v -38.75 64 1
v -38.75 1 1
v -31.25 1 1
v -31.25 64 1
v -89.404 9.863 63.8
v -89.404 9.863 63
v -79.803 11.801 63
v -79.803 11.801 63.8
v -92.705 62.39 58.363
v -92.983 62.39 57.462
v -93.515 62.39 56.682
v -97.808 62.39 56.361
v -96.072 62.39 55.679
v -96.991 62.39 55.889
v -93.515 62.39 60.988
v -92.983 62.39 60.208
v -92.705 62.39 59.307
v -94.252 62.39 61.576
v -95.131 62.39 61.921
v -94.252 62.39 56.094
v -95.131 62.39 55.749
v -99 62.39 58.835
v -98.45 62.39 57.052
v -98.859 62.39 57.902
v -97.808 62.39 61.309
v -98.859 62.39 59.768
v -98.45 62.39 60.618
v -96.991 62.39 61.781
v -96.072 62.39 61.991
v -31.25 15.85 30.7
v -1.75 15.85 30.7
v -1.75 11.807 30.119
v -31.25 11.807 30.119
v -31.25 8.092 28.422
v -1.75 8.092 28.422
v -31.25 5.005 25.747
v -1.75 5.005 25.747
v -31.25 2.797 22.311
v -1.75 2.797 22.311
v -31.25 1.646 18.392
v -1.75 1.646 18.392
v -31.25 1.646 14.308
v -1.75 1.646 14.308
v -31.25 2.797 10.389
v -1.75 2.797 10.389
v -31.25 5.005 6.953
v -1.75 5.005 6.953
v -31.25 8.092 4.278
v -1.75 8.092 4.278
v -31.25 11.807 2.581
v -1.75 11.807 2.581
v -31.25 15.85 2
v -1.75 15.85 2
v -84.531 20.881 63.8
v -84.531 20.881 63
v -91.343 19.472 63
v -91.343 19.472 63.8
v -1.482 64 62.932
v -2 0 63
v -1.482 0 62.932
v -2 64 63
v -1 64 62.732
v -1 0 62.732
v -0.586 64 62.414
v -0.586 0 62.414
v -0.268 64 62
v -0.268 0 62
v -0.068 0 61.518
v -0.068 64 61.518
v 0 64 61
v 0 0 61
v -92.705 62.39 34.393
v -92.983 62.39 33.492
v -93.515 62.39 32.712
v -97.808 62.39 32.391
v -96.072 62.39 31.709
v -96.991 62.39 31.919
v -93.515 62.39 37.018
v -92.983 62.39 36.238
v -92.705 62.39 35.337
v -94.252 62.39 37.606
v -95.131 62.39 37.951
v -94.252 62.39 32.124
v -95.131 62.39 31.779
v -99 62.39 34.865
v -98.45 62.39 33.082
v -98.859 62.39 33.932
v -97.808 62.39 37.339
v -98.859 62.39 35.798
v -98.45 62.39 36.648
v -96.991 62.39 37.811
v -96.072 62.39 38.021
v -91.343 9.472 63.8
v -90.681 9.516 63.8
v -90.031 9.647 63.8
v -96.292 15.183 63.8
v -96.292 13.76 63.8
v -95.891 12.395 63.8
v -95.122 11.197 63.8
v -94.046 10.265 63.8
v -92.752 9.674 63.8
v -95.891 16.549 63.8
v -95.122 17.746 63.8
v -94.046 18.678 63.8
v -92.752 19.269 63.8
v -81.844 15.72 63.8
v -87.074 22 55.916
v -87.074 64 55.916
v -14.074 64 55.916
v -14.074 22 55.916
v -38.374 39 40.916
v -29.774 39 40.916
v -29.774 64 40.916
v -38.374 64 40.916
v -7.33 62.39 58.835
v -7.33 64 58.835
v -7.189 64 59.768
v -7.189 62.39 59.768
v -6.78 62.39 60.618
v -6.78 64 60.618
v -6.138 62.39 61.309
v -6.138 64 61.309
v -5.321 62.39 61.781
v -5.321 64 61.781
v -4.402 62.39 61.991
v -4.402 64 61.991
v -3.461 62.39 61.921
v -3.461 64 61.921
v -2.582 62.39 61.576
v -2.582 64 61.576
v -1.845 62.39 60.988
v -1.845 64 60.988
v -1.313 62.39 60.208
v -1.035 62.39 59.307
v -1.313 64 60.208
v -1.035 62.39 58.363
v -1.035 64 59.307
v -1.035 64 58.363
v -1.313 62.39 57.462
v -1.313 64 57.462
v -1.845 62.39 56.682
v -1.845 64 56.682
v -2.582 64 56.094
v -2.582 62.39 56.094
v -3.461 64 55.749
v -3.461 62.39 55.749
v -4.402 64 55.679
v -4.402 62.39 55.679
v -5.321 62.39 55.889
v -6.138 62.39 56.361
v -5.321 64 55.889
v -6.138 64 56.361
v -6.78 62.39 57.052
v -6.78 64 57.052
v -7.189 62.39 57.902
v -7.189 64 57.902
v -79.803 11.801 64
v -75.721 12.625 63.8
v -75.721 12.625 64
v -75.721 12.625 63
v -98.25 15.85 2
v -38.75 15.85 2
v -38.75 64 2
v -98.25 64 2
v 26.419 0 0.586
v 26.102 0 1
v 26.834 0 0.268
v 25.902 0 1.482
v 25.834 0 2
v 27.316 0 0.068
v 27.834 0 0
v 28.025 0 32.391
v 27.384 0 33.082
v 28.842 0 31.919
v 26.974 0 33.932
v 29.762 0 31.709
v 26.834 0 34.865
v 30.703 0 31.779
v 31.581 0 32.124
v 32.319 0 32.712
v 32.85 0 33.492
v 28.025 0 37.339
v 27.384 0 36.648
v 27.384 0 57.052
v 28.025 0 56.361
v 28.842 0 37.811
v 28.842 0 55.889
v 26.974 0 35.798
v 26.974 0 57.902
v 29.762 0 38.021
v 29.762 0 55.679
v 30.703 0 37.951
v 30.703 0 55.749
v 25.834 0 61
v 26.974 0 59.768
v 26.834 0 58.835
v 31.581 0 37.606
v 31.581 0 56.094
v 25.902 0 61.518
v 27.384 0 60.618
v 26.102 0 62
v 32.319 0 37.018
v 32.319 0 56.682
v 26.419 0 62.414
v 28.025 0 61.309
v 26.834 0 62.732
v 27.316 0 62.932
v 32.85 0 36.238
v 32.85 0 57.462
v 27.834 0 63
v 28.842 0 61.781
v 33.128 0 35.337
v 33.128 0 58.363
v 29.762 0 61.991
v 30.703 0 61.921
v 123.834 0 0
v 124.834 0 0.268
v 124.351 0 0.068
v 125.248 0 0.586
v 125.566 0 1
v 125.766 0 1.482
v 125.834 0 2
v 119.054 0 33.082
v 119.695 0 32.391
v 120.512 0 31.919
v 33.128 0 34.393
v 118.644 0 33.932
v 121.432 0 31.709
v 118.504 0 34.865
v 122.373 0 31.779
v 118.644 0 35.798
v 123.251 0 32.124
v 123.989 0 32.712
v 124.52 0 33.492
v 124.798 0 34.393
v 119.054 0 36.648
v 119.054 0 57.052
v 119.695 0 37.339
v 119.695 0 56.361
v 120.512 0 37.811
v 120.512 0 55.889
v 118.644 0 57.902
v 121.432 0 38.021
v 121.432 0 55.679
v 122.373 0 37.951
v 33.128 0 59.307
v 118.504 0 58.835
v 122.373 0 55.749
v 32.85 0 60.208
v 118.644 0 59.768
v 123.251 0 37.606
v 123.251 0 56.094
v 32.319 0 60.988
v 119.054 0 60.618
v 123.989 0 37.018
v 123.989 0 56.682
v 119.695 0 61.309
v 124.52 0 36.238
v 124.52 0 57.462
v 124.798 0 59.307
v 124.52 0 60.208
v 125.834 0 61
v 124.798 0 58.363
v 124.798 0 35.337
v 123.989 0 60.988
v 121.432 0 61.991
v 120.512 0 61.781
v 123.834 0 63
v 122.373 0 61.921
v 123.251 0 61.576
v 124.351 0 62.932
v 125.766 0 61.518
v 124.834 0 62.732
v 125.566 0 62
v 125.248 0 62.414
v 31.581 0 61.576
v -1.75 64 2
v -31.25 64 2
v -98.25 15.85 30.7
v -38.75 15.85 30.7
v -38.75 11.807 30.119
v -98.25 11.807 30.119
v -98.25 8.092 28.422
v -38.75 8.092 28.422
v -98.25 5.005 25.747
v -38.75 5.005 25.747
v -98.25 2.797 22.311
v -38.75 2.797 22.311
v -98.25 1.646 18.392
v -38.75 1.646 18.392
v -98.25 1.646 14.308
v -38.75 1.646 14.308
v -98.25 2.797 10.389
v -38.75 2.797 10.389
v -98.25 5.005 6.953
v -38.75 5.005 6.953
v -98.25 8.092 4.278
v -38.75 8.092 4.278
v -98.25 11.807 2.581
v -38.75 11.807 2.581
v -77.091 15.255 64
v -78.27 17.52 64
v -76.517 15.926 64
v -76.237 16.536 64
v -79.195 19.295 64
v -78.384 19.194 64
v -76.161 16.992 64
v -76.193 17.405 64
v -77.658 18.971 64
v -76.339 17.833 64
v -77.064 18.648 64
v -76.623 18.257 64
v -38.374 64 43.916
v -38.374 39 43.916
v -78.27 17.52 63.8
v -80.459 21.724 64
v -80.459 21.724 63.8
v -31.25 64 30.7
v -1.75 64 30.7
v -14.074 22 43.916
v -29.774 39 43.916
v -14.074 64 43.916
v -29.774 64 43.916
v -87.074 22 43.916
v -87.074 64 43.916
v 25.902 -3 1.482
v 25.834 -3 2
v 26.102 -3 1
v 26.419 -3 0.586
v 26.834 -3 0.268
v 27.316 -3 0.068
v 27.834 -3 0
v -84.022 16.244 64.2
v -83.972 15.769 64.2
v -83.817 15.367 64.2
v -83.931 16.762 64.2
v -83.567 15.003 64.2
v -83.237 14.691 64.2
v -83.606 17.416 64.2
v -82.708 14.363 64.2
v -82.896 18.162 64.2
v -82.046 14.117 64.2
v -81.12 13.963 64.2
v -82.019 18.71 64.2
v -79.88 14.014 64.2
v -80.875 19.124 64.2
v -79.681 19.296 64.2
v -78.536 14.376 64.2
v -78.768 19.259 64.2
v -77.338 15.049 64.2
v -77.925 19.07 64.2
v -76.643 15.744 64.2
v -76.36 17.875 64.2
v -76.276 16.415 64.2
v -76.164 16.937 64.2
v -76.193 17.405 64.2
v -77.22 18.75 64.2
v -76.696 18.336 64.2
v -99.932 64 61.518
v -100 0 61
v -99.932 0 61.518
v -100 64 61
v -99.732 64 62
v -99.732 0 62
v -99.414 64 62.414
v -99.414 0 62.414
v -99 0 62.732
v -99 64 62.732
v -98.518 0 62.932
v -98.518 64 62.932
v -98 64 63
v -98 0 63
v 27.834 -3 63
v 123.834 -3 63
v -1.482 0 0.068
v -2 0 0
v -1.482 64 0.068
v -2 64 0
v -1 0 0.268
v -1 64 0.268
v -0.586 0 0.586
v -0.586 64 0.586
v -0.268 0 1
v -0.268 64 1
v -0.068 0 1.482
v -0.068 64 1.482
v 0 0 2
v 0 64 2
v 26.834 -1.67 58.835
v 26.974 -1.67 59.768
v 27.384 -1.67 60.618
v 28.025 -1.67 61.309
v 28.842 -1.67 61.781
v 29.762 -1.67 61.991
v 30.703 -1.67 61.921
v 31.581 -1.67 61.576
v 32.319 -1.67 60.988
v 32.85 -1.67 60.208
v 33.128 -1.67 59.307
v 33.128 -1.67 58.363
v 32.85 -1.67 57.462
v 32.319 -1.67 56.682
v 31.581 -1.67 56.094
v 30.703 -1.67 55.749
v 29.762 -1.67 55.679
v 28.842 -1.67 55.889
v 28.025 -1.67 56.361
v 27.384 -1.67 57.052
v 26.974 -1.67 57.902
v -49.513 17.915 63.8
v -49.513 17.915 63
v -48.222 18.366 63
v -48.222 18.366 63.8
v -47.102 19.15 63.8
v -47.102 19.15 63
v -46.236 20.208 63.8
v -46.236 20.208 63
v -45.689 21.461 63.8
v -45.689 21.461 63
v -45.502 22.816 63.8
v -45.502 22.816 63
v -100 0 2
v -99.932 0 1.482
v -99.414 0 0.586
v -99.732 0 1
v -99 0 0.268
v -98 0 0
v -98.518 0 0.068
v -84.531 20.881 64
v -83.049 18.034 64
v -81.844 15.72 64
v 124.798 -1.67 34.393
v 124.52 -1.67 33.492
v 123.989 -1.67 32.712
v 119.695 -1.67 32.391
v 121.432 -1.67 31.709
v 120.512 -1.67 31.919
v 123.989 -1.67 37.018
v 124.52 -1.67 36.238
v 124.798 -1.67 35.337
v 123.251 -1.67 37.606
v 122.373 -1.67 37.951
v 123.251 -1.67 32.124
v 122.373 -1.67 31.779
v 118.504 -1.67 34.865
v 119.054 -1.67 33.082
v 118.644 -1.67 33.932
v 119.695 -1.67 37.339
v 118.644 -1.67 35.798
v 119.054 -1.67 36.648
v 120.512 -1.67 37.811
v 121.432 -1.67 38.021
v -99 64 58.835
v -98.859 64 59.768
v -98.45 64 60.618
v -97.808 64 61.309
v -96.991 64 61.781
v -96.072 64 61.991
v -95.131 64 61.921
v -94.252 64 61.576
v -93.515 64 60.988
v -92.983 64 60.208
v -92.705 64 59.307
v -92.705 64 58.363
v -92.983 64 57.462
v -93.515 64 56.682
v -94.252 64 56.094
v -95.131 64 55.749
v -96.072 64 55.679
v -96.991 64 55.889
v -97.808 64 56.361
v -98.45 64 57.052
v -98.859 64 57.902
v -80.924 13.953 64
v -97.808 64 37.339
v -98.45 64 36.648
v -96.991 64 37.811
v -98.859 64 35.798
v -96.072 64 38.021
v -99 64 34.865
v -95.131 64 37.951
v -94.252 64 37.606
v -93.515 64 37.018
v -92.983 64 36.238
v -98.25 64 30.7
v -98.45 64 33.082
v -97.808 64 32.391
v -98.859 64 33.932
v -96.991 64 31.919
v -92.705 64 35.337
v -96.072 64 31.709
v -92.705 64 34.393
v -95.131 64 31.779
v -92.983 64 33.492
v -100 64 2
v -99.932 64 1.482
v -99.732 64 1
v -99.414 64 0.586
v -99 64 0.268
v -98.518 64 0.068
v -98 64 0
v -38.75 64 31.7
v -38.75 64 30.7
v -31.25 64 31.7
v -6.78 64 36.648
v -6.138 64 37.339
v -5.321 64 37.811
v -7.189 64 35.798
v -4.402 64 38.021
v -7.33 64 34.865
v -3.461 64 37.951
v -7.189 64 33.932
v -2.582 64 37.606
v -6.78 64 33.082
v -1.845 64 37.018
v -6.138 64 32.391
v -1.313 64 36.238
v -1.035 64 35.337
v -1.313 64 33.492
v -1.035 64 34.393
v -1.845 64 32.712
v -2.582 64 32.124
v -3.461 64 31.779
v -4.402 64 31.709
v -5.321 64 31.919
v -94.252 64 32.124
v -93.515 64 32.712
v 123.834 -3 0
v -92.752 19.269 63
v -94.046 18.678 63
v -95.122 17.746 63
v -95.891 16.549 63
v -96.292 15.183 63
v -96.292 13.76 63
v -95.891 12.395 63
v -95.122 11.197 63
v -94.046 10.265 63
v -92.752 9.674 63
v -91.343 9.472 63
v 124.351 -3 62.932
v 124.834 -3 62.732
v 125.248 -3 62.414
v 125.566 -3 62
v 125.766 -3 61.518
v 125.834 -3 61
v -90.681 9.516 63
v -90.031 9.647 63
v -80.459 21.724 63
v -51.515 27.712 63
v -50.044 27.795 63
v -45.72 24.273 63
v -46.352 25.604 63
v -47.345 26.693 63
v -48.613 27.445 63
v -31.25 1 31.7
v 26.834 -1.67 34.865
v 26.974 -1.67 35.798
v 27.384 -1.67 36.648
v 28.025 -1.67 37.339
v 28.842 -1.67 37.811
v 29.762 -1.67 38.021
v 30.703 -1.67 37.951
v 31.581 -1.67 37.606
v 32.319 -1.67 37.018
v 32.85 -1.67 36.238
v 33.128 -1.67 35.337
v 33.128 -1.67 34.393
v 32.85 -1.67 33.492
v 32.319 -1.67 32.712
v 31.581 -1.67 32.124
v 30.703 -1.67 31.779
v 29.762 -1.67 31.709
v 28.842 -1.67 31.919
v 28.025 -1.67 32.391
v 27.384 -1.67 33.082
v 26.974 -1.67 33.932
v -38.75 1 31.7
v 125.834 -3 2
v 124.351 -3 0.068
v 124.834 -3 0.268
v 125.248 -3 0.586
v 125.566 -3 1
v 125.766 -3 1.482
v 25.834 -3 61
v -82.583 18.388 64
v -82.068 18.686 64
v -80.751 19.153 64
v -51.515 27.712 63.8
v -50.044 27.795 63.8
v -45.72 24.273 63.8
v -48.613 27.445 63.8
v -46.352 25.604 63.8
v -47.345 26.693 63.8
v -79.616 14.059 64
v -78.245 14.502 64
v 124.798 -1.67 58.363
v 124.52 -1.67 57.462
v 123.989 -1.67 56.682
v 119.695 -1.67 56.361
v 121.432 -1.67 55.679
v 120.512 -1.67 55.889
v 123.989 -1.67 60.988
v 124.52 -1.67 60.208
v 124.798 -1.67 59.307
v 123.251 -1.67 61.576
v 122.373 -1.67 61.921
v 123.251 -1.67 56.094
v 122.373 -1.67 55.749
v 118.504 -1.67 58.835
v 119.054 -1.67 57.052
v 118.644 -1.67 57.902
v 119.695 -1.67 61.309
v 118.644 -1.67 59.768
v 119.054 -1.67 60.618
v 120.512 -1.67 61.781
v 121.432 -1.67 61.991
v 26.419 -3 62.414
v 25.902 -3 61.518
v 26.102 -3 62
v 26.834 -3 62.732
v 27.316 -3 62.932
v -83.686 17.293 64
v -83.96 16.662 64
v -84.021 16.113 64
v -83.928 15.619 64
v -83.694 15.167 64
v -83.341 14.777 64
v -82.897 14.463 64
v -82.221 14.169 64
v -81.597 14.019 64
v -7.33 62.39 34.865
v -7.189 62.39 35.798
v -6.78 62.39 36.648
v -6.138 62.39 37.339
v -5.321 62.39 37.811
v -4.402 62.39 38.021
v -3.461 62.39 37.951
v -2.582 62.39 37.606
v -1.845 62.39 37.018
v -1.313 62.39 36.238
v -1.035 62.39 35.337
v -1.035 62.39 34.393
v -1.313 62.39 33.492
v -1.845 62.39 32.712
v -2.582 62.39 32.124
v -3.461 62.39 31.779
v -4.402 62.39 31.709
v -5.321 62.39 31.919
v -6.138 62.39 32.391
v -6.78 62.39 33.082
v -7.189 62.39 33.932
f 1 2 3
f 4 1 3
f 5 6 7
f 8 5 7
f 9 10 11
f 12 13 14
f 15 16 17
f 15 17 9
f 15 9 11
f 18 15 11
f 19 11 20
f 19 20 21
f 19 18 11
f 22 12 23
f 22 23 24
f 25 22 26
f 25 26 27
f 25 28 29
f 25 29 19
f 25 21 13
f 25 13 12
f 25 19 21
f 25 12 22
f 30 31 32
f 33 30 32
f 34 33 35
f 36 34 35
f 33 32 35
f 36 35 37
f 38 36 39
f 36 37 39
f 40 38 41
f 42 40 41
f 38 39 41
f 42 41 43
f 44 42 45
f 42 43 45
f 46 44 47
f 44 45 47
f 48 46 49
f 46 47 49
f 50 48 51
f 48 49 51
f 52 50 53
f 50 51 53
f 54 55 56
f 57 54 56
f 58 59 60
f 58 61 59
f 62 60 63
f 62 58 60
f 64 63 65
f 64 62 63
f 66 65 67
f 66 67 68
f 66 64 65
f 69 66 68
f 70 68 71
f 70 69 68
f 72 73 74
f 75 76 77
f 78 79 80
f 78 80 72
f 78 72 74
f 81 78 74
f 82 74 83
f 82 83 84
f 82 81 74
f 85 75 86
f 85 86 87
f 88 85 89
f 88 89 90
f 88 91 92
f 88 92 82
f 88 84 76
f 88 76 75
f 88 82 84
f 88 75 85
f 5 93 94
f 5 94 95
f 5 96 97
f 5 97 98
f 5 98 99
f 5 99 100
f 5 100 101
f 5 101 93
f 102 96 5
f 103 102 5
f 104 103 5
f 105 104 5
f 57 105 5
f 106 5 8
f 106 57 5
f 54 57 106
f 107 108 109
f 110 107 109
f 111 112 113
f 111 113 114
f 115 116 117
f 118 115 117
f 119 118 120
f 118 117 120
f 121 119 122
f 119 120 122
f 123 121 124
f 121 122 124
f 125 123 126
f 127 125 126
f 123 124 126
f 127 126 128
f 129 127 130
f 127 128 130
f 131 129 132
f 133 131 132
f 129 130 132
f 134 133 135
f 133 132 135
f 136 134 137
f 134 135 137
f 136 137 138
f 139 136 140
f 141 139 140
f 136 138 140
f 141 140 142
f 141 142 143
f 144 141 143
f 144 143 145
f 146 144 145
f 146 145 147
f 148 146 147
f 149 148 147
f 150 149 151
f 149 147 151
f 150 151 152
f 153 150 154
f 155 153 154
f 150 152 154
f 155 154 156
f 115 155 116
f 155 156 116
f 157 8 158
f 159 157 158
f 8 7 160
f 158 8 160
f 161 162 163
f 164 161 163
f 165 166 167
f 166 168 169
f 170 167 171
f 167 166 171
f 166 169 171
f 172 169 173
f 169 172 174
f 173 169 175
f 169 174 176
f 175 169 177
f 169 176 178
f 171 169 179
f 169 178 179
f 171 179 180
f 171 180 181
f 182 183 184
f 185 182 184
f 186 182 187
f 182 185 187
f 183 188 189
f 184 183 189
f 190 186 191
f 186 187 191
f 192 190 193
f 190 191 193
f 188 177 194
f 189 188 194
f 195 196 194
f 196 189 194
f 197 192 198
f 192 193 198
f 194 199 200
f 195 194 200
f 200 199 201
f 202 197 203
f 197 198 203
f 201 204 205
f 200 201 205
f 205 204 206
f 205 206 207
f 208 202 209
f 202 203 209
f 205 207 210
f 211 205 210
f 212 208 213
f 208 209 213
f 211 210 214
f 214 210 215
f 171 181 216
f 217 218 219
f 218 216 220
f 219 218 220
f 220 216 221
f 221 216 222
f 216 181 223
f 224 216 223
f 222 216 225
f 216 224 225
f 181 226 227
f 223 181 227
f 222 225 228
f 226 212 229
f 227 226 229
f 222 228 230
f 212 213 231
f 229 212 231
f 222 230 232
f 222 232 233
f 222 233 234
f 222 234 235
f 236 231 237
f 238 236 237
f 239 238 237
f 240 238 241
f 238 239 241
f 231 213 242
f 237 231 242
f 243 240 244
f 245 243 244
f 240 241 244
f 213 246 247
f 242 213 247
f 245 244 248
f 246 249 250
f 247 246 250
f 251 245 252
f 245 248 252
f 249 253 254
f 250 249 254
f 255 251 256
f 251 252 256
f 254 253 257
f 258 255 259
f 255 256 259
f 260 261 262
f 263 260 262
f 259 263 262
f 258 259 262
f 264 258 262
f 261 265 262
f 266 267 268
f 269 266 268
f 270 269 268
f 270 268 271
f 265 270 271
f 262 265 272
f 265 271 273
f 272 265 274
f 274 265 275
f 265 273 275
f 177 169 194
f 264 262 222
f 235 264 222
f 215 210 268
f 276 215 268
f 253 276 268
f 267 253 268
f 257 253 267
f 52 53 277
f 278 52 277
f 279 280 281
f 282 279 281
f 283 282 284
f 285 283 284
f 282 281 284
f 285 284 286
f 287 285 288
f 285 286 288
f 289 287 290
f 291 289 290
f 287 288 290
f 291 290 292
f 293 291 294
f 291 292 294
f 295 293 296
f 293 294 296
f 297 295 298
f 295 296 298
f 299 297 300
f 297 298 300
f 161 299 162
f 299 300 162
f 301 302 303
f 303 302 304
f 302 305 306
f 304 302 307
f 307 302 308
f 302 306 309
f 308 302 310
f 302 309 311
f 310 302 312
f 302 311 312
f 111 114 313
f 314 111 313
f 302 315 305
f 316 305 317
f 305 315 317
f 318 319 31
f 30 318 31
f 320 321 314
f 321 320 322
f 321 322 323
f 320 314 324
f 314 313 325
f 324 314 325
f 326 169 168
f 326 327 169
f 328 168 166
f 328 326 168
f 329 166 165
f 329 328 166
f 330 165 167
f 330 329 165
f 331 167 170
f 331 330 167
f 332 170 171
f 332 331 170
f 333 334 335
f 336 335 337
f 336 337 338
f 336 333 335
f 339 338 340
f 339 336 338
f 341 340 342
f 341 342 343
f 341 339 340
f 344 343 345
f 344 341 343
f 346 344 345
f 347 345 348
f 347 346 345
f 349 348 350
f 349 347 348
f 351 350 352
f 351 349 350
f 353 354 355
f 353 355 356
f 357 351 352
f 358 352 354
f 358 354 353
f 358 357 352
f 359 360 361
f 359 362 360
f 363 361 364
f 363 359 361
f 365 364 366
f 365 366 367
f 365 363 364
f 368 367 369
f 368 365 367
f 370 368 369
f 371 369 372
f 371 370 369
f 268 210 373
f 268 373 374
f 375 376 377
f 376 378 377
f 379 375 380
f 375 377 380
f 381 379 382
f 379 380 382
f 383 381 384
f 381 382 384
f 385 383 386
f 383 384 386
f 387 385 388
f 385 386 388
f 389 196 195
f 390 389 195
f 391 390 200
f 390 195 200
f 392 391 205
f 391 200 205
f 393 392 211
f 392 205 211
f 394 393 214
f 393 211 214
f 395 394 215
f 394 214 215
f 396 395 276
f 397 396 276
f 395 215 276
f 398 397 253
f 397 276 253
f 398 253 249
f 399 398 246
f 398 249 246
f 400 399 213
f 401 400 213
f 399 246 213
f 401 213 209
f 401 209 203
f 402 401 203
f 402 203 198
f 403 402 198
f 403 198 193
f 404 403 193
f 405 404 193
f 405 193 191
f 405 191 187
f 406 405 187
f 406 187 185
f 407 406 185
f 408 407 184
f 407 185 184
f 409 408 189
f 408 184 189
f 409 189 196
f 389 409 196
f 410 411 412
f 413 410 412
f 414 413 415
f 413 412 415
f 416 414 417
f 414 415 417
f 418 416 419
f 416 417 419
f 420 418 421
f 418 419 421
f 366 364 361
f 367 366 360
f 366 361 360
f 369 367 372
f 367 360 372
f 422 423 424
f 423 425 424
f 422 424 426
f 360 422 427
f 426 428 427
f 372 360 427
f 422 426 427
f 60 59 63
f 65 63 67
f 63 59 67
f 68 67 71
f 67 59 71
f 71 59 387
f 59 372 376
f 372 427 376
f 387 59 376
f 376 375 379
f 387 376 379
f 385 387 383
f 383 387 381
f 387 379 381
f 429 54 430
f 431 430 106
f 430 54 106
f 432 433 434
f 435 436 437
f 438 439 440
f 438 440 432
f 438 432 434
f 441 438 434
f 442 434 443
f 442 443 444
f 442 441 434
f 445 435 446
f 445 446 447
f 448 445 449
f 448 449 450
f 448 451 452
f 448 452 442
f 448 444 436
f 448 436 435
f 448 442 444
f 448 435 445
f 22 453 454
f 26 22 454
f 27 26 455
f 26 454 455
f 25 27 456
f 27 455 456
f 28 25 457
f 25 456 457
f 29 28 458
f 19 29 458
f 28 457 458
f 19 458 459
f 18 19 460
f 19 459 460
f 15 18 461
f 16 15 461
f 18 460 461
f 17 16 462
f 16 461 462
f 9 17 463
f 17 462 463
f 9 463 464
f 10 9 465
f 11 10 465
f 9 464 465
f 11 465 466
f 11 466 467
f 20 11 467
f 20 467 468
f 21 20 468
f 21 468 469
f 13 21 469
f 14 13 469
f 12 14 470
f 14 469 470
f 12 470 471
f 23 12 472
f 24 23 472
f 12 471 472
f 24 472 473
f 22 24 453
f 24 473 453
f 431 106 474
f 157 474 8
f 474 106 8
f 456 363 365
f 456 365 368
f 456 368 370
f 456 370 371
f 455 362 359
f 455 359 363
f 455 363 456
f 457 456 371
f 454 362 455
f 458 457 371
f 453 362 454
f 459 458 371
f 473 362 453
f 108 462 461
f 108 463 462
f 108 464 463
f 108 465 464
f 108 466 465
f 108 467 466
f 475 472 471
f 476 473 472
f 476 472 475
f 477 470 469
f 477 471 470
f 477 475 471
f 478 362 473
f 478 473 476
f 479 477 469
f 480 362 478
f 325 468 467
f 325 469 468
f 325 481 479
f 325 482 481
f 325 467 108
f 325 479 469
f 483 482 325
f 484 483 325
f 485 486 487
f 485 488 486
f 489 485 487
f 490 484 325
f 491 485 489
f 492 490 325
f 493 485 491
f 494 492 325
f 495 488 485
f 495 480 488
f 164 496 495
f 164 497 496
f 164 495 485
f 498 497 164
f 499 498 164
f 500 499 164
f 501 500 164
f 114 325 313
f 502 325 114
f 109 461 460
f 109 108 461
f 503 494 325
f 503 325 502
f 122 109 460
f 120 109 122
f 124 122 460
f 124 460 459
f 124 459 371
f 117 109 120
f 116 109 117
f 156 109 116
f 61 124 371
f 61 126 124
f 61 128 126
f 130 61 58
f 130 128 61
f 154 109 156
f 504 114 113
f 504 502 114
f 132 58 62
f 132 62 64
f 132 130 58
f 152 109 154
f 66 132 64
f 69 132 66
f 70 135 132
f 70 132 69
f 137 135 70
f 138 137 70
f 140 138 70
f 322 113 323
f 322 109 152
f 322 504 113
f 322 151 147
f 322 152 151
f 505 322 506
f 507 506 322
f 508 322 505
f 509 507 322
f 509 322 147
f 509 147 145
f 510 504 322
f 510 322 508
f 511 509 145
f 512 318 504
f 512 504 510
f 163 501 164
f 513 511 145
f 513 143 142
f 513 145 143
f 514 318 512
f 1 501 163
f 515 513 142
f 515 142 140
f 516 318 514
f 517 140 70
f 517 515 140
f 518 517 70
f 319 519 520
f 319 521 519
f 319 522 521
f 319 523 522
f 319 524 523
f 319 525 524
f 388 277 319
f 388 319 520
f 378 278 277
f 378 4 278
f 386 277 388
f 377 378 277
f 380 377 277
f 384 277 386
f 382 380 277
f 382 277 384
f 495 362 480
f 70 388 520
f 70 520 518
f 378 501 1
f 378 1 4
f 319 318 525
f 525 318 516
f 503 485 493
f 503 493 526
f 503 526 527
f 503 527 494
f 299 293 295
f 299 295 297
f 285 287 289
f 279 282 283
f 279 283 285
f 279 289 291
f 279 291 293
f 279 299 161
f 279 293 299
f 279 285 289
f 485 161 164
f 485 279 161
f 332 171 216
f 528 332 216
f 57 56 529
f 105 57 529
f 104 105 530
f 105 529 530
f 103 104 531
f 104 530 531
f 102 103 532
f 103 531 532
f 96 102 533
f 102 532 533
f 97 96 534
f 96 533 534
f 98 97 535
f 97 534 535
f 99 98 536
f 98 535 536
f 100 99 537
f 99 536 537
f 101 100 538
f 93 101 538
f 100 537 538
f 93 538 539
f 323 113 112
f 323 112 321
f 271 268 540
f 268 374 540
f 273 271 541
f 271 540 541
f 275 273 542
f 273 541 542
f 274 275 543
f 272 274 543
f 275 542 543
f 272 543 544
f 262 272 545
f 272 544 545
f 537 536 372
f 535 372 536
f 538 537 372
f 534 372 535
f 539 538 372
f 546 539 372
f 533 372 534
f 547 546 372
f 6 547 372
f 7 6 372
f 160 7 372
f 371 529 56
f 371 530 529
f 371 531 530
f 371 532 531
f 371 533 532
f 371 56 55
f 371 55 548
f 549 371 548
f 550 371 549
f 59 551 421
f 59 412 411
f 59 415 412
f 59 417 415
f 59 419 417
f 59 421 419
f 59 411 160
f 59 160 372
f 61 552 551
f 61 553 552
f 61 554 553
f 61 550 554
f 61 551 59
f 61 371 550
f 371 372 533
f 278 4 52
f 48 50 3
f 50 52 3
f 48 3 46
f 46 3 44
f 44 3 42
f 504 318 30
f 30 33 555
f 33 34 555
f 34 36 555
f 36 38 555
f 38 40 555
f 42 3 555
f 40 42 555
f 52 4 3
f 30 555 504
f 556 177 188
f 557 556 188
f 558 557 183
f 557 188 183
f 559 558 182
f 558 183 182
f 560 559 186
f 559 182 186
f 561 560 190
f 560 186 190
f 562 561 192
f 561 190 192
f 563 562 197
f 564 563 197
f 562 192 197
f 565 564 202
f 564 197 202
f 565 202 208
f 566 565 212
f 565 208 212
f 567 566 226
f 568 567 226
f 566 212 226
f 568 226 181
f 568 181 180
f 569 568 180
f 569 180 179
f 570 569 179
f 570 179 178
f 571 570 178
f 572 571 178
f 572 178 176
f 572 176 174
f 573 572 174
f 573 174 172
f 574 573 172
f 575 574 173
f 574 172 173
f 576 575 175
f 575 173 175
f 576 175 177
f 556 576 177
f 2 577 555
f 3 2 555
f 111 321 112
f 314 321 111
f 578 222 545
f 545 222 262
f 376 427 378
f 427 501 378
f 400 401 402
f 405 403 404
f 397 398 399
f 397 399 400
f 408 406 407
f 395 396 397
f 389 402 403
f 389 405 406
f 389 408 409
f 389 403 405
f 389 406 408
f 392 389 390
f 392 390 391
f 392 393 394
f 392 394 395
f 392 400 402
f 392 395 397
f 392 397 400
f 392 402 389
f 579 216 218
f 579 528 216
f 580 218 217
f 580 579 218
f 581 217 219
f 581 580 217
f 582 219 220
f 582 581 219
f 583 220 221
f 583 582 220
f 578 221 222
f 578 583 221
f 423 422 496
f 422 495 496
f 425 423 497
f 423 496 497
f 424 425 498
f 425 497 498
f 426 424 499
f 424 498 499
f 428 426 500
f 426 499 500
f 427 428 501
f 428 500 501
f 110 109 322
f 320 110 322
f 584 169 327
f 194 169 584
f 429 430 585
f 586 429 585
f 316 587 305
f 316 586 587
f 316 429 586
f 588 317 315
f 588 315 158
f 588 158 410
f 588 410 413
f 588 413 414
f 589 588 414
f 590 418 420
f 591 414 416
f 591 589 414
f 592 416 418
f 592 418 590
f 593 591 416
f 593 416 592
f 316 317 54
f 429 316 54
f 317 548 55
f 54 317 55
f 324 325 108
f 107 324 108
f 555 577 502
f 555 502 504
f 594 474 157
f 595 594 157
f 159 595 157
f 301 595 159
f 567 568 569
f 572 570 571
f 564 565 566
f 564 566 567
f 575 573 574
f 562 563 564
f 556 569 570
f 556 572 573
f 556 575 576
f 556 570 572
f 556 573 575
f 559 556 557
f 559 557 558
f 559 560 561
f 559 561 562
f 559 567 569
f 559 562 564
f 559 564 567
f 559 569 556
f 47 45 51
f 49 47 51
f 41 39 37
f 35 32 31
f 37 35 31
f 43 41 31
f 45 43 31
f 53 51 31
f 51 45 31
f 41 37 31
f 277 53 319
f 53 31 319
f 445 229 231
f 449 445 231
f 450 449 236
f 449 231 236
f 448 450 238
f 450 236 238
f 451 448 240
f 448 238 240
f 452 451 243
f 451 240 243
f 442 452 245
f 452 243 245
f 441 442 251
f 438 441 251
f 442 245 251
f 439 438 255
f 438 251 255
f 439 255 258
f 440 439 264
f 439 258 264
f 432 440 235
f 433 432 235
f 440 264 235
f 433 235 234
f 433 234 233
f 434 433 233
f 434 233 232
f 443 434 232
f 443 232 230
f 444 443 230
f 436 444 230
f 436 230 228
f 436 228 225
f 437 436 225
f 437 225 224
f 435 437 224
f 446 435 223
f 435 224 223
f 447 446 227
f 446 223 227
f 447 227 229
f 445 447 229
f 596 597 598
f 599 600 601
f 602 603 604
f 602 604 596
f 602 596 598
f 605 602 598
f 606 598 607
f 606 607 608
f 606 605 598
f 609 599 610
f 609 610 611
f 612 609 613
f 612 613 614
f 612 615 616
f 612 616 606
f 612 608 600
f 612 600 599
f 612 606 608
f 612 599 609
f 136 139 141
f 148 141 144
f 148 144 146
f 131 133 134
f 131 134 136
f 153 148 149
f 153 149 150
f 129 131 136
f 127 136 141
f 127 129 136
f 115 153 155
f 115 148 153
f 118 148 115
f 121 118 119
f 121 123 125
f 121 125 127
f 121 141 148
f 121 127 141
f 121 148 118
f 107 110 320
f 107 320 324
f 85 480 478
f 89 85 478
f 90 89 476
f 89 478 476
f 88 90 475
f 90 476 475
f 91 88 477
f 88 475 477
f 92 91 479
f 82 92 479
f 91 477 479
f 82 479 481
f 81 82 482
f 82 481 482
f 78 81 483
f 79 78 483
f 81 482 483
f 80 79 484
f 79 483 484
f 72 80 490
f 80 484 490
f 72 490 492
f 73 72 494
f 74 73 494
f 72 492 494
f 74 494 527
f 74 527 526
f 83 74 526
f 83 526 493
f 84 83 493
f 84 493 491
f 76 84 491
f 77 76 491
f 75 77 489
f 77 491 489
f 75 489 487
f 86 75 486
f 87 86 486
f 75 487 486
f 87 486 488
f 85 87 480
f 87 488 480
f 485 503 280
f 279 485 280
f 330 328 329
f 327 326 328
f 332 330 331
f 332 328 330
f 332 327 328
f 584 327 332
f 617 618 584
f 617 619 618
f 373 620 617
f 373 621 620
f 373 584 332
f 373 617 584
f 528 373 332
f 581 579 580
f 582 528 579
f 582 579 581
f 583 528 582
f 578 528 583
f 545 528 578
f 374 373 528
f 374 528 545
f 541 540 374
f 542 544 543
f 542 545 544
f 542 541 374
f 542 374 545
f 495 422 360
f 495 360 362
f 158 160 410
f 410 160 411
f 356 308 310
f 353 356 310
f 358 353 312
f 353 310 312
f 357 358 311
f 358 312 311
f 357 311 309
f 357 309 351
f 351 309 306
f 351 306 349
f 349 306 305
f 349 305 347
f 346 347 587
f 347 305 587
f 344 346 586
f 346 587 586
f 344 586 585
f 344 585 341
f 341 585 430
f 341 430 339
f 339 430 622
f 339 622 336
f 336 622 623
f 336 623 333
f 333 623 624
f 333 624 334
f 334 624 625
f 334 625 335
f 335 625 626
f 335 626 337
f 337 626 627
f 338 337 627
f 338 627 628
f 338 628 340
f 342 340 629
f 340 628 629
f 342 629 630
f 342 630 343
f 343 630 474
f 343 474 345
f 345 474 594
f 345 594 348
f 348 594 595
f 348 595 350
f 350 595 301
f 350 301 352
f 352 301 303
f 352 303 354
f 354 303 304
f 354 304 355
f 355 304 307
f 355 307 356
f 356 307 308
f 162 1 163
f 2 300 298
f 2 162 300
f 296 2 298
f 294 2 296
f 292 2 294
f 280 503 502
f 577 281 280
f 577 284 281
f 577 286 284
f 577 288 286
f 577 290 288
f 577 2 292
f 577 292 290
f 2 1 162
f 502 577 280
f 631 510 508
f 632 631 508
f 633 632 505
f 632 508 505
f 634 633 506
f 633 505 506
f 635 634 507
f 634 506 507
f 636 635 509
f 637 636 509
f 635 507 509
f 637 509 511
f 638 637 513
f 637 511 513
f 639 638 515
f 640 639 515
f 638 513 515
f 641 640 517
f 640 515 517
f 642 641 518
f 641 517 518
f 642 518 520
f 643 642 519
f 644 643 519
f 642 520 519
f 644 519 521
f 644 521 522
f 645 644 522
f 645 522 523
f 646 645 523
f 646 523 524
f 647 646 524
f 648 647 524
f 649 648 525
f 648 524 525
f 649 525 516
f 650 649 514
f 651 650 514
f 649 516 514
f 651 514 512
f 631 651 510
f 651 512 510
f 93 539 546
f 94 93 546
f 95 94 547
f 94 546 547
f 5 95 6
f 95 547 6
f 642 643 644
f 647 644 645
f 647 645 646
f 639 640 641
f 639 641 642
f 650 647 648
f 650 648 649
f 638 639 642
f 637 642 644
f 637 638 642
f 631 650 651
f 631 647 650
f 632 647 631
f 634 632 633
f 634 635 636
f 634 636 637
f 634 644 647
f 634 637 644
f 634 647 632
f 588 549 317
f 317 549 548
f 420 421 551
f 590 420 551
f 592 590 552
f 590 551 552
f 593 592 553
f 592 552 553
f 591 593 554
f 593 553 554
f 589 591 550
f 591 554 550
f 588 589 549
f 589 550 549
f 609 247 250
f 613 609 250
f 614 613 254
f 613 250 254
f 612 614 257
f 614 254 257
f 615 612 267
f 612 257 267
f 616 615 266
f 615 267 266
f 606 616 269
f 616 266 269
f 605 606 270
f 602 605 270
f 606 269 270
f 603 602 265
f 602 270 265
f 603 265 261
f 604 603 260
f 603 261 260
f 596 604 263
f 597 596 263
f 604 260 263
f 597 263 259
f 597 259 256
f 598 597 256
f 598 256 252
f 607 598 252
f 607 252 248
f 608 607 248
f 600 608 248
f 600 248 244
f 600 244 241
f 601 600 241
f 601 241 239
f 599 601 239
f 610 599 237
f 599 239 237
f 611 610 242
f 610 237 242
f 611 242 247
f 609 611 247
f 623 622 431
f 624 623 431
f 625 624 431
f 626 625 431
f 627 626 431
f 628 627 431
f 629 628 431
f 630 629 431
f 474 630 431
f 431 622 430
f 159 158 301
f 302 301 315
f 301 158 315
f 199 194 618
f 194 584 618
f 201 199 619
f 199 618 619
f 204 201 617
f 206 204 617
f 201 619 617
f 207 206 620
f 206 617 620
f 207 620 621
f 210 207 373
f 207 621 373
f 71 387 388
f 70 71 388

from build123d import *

# Parameters (mm, degrees)
F0_W      = 100
F0_H      = 64
F1_DEPTH  = 63
F3_START  = -1.75
F3_DEPTH  = 96.5
F5_START  = -1
F4_W      = 7.5
F4_H      = 30.7
F5_DEPTH  = 63
F7_DEPTH  = 42
F6_W      = 8.6
F6_H      = 3
F8_DEPTH  = 25
F9_W      = 100
F9_H      = 63
F10_DEPTH = 3
F11_R     = 3.165
F12_DEPTH = 1.61
F13_R     = 3.165
F14_DEPTH = 1.67
F15_R     = 2
F15_2_R   = 2
F17_DEPTH = 0.8
F18_DEPTH = 1
F20_DEPTH = 0.2


with BuildPart() as f1:
    # F0 (on Top) → F1 (new body)
    with BuildSketch(Plane.XY):
        with Locations((-50, 32)):
            Rectangle(F0_W, F0_H)
    extrude(amount=F1_DEPTH)

    # F2 (on face) → F3 (cut)
    with BuildSketch(Plane.YZ.offset(F3_START)):
        with BuildLine():
            ThreePointArc((15.85, 2), (25.99698231, 6.20301769), (30.2, 16.35))
            ThreePointArc((30.2, 16.35), (25.99698231, 26.49698231), (15.85, 30.7))
            ThreePointArc((15.85, 30.7), (1.5, 16.35), (15.85, 2))
        make_face()
        with BuildLine():
            ThreePointArc((15.85, 30.7), (25.99698231, 26.49698231), (30.2, 16.35))
            ThreePointArc((30.2, 16.35), (25.99698231, 6.20301769), (15.85, 2))
            Line((15.85, 2), (47.85, 2))
            ThreePointArc((47.85, 2), (33.5, 16.35), (47.85, 30.7))
            Line((47.85, 30.7), (15.85, 30.7))
        make_face()
        with BuildLine():
            Line((64, 30.7), (47.85, 30.7))
            ThreePointArc((47.85, 30.7), (57.99698231, 26.49698231), (62.2, 16.35))
            ThreePointArc((62.2, 16.35), (57.99698231, 6.20301769), (47.85, 2))
            Line((47.85, 2), (64, 2))
            Line((64, 2), (64, 30.7))
        make_face()
        with BuildLine():
            ThreePointArc((62.2, 16.35), (57.99698231, 26.49698231), (47.85, 30.7))
            ThreePointArc((47.85, 30.7), (33.5, 16.35), (47.85, 2))
            ThreePointArc((47.85, 2), (57.99698231, 6.20301769), (62.2, 16.35))
        make_face()
    extrude(amount=-F3_DEPTH, mode=Mode.SUBTRACT)

    # F4 (on face) → F5 (cut)
    with BuildSketch(Plane.XZ.offset(F5_START)):
        with Locations((-35, 16.35)):
            Rectangle(F4_W, F4_H)
    extrude(amount=-F5_DEPTH, mode=Mode.SUBTRACT)

    # F6 (on face) → F7 (cut)
    with BuildSketch(Plane(origin=(0, 64, 0), x_dir=(-1, 0, 0), z_dir=(0, 1, 0))):
        Polygon((87.0742898487, 55.9157994471), (14.0742898487, 55.9157994471), (14.0742898487, 43.9157994471), (29.7742898487, 43.9157994471), (38.3742898487, 43.9157994471), (87.0742898487, 43.9157994471), align=None)
    extrude(amount=-F7_DEPTH, mode=Mode.SUBTRACT)

    # F6 (on face) → F8 (cut)
    with BuildSketch(Plane(origin=(0, 64, 0), x_dir=(-1, 0, 0), z_dir=(0, 1, 0))):
        with Locations((34.0742898487, 42.4157994471)):
            Rectangle(F6_W, F6_H)
    extrude(amount=-F8_DEPTH, mode=Mode.SUBTRACT)

    # F11 (on face) → F12 (cut)
    with BuildSketch(Plane(origin=(0, 64, 0), x_dir=(-1, 0, 0), z_dir=(0, 1, 0))):
        with Locations((95.835, 58.835)):
            Circle(F11_R)
        with Locations((95.835, 34.865)):
            Circle(F11_R)
        with Locations((4.165, 58.835)):
            Circle(F11_R)
        with Locations((4.165, 34.865)):
            Circle(F11_R)
    extrude(amount=-F12_DEPTH, mode=Mode.SUBTRACT)

    # F15
    f15_edges = [f1.edges().sort_by_distance(p)[0] for p in [
        (0, 32, 63),
        (0, 32, 0),
        (-100, 32, 0),
        (-100, 32, 63),
    ]]
    fillet(f15_edges, radius=F15_R)

    # F16 (on face) → F17 (join)
    with BuildSketch(Plane.XY.offset(63)):
        with BuildLine():
            ThreePointArc((-91.3430968703, 9.4717235174), (-90.3538525637, 9.5705608286), (-89.403717956, 9.8631652367))
            Line((-89.403717956, 9.8631652367), (-91.3430968703, 9.4717235174))
        make_face()
        with BuildLine():
            ThreePointArc((-45.5024390477, 22.8157792819), (-47.3453227673, 26.6929711513), (-51.5154857645, 27.7120775112))
            ThreePointArc((-51.5154857645, 27.7120775112), (-55.4011839634, 21.8146308158), (-49.5131947411, 17.9146165932))
            ThreePointArc((-49.5131947411, 17.9146165932), (-46.6329286438, 19.6492529149), (-45.5024390477, 22.8157792819))
        make_face()
        with BuildLine():
            ThreePointArc((-89.403717956, 9.8631652367), (-87.1779501399, 11.705579502), (-86.3430968703, 14.4717235174))
            ThreePointArc((-86.3430968703, 14.4717235174), (-87.8075629644, 18.0072574234), (-91.3430968703, 19.4717235174))
            ThreePointArc((-91.3430968703, 19.4717235174), (-96.3430968703, 14.4717235174), (-91.3430968703, 9.4717235174))
            Line((-91.3430968703, 9.4717235174), (-89.403717956, 9.8631652367))
        make_face()
        with BuildLine():
            ThreePointArc((-91.3430968703, 19.4717235174), (-87.8075629644, 18.0072574234), (-86.3430968703, 14.4717235174))
            ThreePointArc((-86.3430968703, 14.4717235174), (-87.1779501399, 11.705579502), (-89.403717956, 9.8631652367))
            Line((-89.403717956, 9.8631652367), (-79.8028434912, 11.8009932596))
            Line((-79.8028434912, 11.8009932596), (-81.8437926947, 15.720318451))
            Line((-81.8437926947, 15.720318451), (-84.5312201365, 20.8811044491))
            Line((-84.5312201365, 20.8811044491), (-91.3430968703, 19.4717235174))
        make_face()
        with BuildLine():
            Line((-51.5154857645, 27.7120775112), (-80.4593477879, 21.7235770112))
            Line((-80.4593477879, 21.7235770112), (-78.2704292539, 17.520099758))
            Line((-78.2704292539, 17.520099758), (-75.7212589077, 12.6248149867))
            Line((-75.7212589077, 12.6248149867), (-49.5131947411, 17.9146165932))
            ThreePointArc((-49.5131947411, 17.9146165932), (-55.4011839634, 21.8146308158), (-51.5154857645, 27.7120775112))
        make_face()
    extrude(amount=F17_DEPTH)

    # F16 (on face) → F18 (join)
    with BuildSketch(Plane.XY.offset(63)):
        with BuildLine():
            Line((-80.4593477879, 21.7235770112), (-84.5312201365, 20.8811044491))
            Line((-84.5312201365, 20.8811044491), (-81.8437926947, 15.720318451))
            add(Edge.make_bspline(
                [(-78.2704292539, 17.520099758), (-79.4249144457, 19.7371087933), (-81.2115961486, 18.8372181486), (-82.9982778516, 17.9373275039), (-81.8437926947, 15.720318451)],
                knots=[1.5407196056, 1.5407196056, 1.5407196056, 3.1115159226, 3.1115159226, 4.6823122396, 4.6823122396, 4.6823122396], degree=2, weights=[1, 0.7071067846, 1, 0.7071067846, 1]))
            Line((-78.2704292539, 17.520099758), (-80.4593477879, 21.7235770112))
        make_face()
        with BuildLine():
            Line((-81.8437926947, 15.720318451), (-79.8028434912, 11.8009932596))
            Line((-79.8028434912, 11.8009932596), (-75.7212589077, 12.6248149867))
            Line((-75.7212589077, 12.6248149867), (-78.2704292539, 17.520099758))
            add(Edge.make_bspline(
                [(-78.8494184734, 14.431264394), (-77.1501552786, 15.3687880367), (-78.2704292539, 17.520099758)],
                knots=[0, 0, 0, 1.5407196056, 1.5407196056, 1.5407196056], degree=2, weights=[1, 0.7176601517, 1]))
            add(Edge.make_bspline(
                [(-81.8437926947, 15.720318451), (-80.6540515248, 13.4356057124), (-78.8494184734, 14.431264394)],
                knots=[4.6823122396, 4.6823122396, 4.6823122396, 6.2831853072, 6.2831853072, 6.2831853072], degree=2, weights=[1, 0.6963934928, 1]))
        make_face()
        with BuildLine():
            add(Edge.make_bspline(
                [(-78.2704292539, 17.520099758), (-79.4249144457, 19.7371087933), (-81.2115961486, 18.8372181486), (-82.9982778516, 17.9373275039), (-81.8437926947, 15.720318451)],
                knots=[1.5407196056, 1.5407196056, 1.5407196056, 3.1115159226, 3.1115159226, 4.6823122396, 4.6823122396, 4.6823122396], degree=2, weights=[1, 0.7071067846, 1, 0.7071067846, 1]))
            add(Edge.make_bspline(
                [(-81.8437926947, 15.720318451), (-80.6540515248, 13.4356057124), (-78.8494184734, 14.431264394)],
                knots=[4.6823122396, 4.6823122396, 4.6823122396, 6.2831853072, 6.2831853072, 6.2831853072], degree=2, weights=[1, 0.6963934928, 1]))
            add(Edge.make_bspline(
                [(-78.8494184734, 14.431264394), (-77.1501552786, 15.3687880367), (-78.2704292539, 17.520099758)],
                knots=[0, 0, 0, 1.5407196056, 1.5407196056, 1.5407196056], degree=2, weights=[1, 0.7176601517, 1]))
        make_face()
    extrude(amount=F18_DEPTH)

    # F19 (on face) → F20 (join)
    with BuildSketch(Plane.XY.offset(64)):
        with BuildLine():
            add(Edge.make_bspline(
                [(-76.1928409338, 17.405230552), (-77.0794322976, 21.8381852527), (-82.4835310821, 18.4522284502), (-87.8876298666, 15.0662716478), (-81.5969397183, 14.0192737495), (-75.30624957, 12.9722758513), (-76.1928409338, 17.405230552)],
                knots=[0, 0, 0, 2.0943951024, 2.0943951024, 4.1887902048, 4.1887902048, 6.2831853072, 6.2831853072, 6.2831853072], degree=2, weights=[1, 0.5, 1, 0.5, 1, 0.5, 1]))
        make_face()
    extrude(amount=F20_DEPTH)


with BuildPart() as f10:
    # F9 (on Front) → F10 (new body)
    with BuildSketch(Plane.XZ):
        with Locations((75.833710218, 31.5)):
            Rectangle(F9_W, F9_H)
    extrude(amount=F10_DEPTH)

    # F13 (on face) → F14 (cut)
    with BuildSketch(Plane(origin=(0, 0, 0), x_dir=(-1, 0, 0), z_dir=(0, 1, 0))):
        with Locations((-29.998710218, 34.865)):
            Circle(F13_R)
        with Locations((-29.998710218, 58.835)):
            Circle(F13_R)
        with Locations((-121.668710218, 58.835)):
            Circle(F13_R)
        with Locations((-121.668710218, 34.865)):
            Circle(F13_R)
    extrude(amount=-F14_DEPTH, mode=Mode.SUBTRACT)

    # F15#2
    f15_2_edges = [f10.edges().sort_by_distance(p)[0] for p in [
        (125.83371, -1.5, 63),
        (125.83371, -1.5, 0),
        (25.83371, -1.5, 0),
        (25.83371, -1.5, 63),
    ]]
    fillet(f15_2_edges, radius=F15_2_R)


solid = Compound([f1.part, f10.part])
